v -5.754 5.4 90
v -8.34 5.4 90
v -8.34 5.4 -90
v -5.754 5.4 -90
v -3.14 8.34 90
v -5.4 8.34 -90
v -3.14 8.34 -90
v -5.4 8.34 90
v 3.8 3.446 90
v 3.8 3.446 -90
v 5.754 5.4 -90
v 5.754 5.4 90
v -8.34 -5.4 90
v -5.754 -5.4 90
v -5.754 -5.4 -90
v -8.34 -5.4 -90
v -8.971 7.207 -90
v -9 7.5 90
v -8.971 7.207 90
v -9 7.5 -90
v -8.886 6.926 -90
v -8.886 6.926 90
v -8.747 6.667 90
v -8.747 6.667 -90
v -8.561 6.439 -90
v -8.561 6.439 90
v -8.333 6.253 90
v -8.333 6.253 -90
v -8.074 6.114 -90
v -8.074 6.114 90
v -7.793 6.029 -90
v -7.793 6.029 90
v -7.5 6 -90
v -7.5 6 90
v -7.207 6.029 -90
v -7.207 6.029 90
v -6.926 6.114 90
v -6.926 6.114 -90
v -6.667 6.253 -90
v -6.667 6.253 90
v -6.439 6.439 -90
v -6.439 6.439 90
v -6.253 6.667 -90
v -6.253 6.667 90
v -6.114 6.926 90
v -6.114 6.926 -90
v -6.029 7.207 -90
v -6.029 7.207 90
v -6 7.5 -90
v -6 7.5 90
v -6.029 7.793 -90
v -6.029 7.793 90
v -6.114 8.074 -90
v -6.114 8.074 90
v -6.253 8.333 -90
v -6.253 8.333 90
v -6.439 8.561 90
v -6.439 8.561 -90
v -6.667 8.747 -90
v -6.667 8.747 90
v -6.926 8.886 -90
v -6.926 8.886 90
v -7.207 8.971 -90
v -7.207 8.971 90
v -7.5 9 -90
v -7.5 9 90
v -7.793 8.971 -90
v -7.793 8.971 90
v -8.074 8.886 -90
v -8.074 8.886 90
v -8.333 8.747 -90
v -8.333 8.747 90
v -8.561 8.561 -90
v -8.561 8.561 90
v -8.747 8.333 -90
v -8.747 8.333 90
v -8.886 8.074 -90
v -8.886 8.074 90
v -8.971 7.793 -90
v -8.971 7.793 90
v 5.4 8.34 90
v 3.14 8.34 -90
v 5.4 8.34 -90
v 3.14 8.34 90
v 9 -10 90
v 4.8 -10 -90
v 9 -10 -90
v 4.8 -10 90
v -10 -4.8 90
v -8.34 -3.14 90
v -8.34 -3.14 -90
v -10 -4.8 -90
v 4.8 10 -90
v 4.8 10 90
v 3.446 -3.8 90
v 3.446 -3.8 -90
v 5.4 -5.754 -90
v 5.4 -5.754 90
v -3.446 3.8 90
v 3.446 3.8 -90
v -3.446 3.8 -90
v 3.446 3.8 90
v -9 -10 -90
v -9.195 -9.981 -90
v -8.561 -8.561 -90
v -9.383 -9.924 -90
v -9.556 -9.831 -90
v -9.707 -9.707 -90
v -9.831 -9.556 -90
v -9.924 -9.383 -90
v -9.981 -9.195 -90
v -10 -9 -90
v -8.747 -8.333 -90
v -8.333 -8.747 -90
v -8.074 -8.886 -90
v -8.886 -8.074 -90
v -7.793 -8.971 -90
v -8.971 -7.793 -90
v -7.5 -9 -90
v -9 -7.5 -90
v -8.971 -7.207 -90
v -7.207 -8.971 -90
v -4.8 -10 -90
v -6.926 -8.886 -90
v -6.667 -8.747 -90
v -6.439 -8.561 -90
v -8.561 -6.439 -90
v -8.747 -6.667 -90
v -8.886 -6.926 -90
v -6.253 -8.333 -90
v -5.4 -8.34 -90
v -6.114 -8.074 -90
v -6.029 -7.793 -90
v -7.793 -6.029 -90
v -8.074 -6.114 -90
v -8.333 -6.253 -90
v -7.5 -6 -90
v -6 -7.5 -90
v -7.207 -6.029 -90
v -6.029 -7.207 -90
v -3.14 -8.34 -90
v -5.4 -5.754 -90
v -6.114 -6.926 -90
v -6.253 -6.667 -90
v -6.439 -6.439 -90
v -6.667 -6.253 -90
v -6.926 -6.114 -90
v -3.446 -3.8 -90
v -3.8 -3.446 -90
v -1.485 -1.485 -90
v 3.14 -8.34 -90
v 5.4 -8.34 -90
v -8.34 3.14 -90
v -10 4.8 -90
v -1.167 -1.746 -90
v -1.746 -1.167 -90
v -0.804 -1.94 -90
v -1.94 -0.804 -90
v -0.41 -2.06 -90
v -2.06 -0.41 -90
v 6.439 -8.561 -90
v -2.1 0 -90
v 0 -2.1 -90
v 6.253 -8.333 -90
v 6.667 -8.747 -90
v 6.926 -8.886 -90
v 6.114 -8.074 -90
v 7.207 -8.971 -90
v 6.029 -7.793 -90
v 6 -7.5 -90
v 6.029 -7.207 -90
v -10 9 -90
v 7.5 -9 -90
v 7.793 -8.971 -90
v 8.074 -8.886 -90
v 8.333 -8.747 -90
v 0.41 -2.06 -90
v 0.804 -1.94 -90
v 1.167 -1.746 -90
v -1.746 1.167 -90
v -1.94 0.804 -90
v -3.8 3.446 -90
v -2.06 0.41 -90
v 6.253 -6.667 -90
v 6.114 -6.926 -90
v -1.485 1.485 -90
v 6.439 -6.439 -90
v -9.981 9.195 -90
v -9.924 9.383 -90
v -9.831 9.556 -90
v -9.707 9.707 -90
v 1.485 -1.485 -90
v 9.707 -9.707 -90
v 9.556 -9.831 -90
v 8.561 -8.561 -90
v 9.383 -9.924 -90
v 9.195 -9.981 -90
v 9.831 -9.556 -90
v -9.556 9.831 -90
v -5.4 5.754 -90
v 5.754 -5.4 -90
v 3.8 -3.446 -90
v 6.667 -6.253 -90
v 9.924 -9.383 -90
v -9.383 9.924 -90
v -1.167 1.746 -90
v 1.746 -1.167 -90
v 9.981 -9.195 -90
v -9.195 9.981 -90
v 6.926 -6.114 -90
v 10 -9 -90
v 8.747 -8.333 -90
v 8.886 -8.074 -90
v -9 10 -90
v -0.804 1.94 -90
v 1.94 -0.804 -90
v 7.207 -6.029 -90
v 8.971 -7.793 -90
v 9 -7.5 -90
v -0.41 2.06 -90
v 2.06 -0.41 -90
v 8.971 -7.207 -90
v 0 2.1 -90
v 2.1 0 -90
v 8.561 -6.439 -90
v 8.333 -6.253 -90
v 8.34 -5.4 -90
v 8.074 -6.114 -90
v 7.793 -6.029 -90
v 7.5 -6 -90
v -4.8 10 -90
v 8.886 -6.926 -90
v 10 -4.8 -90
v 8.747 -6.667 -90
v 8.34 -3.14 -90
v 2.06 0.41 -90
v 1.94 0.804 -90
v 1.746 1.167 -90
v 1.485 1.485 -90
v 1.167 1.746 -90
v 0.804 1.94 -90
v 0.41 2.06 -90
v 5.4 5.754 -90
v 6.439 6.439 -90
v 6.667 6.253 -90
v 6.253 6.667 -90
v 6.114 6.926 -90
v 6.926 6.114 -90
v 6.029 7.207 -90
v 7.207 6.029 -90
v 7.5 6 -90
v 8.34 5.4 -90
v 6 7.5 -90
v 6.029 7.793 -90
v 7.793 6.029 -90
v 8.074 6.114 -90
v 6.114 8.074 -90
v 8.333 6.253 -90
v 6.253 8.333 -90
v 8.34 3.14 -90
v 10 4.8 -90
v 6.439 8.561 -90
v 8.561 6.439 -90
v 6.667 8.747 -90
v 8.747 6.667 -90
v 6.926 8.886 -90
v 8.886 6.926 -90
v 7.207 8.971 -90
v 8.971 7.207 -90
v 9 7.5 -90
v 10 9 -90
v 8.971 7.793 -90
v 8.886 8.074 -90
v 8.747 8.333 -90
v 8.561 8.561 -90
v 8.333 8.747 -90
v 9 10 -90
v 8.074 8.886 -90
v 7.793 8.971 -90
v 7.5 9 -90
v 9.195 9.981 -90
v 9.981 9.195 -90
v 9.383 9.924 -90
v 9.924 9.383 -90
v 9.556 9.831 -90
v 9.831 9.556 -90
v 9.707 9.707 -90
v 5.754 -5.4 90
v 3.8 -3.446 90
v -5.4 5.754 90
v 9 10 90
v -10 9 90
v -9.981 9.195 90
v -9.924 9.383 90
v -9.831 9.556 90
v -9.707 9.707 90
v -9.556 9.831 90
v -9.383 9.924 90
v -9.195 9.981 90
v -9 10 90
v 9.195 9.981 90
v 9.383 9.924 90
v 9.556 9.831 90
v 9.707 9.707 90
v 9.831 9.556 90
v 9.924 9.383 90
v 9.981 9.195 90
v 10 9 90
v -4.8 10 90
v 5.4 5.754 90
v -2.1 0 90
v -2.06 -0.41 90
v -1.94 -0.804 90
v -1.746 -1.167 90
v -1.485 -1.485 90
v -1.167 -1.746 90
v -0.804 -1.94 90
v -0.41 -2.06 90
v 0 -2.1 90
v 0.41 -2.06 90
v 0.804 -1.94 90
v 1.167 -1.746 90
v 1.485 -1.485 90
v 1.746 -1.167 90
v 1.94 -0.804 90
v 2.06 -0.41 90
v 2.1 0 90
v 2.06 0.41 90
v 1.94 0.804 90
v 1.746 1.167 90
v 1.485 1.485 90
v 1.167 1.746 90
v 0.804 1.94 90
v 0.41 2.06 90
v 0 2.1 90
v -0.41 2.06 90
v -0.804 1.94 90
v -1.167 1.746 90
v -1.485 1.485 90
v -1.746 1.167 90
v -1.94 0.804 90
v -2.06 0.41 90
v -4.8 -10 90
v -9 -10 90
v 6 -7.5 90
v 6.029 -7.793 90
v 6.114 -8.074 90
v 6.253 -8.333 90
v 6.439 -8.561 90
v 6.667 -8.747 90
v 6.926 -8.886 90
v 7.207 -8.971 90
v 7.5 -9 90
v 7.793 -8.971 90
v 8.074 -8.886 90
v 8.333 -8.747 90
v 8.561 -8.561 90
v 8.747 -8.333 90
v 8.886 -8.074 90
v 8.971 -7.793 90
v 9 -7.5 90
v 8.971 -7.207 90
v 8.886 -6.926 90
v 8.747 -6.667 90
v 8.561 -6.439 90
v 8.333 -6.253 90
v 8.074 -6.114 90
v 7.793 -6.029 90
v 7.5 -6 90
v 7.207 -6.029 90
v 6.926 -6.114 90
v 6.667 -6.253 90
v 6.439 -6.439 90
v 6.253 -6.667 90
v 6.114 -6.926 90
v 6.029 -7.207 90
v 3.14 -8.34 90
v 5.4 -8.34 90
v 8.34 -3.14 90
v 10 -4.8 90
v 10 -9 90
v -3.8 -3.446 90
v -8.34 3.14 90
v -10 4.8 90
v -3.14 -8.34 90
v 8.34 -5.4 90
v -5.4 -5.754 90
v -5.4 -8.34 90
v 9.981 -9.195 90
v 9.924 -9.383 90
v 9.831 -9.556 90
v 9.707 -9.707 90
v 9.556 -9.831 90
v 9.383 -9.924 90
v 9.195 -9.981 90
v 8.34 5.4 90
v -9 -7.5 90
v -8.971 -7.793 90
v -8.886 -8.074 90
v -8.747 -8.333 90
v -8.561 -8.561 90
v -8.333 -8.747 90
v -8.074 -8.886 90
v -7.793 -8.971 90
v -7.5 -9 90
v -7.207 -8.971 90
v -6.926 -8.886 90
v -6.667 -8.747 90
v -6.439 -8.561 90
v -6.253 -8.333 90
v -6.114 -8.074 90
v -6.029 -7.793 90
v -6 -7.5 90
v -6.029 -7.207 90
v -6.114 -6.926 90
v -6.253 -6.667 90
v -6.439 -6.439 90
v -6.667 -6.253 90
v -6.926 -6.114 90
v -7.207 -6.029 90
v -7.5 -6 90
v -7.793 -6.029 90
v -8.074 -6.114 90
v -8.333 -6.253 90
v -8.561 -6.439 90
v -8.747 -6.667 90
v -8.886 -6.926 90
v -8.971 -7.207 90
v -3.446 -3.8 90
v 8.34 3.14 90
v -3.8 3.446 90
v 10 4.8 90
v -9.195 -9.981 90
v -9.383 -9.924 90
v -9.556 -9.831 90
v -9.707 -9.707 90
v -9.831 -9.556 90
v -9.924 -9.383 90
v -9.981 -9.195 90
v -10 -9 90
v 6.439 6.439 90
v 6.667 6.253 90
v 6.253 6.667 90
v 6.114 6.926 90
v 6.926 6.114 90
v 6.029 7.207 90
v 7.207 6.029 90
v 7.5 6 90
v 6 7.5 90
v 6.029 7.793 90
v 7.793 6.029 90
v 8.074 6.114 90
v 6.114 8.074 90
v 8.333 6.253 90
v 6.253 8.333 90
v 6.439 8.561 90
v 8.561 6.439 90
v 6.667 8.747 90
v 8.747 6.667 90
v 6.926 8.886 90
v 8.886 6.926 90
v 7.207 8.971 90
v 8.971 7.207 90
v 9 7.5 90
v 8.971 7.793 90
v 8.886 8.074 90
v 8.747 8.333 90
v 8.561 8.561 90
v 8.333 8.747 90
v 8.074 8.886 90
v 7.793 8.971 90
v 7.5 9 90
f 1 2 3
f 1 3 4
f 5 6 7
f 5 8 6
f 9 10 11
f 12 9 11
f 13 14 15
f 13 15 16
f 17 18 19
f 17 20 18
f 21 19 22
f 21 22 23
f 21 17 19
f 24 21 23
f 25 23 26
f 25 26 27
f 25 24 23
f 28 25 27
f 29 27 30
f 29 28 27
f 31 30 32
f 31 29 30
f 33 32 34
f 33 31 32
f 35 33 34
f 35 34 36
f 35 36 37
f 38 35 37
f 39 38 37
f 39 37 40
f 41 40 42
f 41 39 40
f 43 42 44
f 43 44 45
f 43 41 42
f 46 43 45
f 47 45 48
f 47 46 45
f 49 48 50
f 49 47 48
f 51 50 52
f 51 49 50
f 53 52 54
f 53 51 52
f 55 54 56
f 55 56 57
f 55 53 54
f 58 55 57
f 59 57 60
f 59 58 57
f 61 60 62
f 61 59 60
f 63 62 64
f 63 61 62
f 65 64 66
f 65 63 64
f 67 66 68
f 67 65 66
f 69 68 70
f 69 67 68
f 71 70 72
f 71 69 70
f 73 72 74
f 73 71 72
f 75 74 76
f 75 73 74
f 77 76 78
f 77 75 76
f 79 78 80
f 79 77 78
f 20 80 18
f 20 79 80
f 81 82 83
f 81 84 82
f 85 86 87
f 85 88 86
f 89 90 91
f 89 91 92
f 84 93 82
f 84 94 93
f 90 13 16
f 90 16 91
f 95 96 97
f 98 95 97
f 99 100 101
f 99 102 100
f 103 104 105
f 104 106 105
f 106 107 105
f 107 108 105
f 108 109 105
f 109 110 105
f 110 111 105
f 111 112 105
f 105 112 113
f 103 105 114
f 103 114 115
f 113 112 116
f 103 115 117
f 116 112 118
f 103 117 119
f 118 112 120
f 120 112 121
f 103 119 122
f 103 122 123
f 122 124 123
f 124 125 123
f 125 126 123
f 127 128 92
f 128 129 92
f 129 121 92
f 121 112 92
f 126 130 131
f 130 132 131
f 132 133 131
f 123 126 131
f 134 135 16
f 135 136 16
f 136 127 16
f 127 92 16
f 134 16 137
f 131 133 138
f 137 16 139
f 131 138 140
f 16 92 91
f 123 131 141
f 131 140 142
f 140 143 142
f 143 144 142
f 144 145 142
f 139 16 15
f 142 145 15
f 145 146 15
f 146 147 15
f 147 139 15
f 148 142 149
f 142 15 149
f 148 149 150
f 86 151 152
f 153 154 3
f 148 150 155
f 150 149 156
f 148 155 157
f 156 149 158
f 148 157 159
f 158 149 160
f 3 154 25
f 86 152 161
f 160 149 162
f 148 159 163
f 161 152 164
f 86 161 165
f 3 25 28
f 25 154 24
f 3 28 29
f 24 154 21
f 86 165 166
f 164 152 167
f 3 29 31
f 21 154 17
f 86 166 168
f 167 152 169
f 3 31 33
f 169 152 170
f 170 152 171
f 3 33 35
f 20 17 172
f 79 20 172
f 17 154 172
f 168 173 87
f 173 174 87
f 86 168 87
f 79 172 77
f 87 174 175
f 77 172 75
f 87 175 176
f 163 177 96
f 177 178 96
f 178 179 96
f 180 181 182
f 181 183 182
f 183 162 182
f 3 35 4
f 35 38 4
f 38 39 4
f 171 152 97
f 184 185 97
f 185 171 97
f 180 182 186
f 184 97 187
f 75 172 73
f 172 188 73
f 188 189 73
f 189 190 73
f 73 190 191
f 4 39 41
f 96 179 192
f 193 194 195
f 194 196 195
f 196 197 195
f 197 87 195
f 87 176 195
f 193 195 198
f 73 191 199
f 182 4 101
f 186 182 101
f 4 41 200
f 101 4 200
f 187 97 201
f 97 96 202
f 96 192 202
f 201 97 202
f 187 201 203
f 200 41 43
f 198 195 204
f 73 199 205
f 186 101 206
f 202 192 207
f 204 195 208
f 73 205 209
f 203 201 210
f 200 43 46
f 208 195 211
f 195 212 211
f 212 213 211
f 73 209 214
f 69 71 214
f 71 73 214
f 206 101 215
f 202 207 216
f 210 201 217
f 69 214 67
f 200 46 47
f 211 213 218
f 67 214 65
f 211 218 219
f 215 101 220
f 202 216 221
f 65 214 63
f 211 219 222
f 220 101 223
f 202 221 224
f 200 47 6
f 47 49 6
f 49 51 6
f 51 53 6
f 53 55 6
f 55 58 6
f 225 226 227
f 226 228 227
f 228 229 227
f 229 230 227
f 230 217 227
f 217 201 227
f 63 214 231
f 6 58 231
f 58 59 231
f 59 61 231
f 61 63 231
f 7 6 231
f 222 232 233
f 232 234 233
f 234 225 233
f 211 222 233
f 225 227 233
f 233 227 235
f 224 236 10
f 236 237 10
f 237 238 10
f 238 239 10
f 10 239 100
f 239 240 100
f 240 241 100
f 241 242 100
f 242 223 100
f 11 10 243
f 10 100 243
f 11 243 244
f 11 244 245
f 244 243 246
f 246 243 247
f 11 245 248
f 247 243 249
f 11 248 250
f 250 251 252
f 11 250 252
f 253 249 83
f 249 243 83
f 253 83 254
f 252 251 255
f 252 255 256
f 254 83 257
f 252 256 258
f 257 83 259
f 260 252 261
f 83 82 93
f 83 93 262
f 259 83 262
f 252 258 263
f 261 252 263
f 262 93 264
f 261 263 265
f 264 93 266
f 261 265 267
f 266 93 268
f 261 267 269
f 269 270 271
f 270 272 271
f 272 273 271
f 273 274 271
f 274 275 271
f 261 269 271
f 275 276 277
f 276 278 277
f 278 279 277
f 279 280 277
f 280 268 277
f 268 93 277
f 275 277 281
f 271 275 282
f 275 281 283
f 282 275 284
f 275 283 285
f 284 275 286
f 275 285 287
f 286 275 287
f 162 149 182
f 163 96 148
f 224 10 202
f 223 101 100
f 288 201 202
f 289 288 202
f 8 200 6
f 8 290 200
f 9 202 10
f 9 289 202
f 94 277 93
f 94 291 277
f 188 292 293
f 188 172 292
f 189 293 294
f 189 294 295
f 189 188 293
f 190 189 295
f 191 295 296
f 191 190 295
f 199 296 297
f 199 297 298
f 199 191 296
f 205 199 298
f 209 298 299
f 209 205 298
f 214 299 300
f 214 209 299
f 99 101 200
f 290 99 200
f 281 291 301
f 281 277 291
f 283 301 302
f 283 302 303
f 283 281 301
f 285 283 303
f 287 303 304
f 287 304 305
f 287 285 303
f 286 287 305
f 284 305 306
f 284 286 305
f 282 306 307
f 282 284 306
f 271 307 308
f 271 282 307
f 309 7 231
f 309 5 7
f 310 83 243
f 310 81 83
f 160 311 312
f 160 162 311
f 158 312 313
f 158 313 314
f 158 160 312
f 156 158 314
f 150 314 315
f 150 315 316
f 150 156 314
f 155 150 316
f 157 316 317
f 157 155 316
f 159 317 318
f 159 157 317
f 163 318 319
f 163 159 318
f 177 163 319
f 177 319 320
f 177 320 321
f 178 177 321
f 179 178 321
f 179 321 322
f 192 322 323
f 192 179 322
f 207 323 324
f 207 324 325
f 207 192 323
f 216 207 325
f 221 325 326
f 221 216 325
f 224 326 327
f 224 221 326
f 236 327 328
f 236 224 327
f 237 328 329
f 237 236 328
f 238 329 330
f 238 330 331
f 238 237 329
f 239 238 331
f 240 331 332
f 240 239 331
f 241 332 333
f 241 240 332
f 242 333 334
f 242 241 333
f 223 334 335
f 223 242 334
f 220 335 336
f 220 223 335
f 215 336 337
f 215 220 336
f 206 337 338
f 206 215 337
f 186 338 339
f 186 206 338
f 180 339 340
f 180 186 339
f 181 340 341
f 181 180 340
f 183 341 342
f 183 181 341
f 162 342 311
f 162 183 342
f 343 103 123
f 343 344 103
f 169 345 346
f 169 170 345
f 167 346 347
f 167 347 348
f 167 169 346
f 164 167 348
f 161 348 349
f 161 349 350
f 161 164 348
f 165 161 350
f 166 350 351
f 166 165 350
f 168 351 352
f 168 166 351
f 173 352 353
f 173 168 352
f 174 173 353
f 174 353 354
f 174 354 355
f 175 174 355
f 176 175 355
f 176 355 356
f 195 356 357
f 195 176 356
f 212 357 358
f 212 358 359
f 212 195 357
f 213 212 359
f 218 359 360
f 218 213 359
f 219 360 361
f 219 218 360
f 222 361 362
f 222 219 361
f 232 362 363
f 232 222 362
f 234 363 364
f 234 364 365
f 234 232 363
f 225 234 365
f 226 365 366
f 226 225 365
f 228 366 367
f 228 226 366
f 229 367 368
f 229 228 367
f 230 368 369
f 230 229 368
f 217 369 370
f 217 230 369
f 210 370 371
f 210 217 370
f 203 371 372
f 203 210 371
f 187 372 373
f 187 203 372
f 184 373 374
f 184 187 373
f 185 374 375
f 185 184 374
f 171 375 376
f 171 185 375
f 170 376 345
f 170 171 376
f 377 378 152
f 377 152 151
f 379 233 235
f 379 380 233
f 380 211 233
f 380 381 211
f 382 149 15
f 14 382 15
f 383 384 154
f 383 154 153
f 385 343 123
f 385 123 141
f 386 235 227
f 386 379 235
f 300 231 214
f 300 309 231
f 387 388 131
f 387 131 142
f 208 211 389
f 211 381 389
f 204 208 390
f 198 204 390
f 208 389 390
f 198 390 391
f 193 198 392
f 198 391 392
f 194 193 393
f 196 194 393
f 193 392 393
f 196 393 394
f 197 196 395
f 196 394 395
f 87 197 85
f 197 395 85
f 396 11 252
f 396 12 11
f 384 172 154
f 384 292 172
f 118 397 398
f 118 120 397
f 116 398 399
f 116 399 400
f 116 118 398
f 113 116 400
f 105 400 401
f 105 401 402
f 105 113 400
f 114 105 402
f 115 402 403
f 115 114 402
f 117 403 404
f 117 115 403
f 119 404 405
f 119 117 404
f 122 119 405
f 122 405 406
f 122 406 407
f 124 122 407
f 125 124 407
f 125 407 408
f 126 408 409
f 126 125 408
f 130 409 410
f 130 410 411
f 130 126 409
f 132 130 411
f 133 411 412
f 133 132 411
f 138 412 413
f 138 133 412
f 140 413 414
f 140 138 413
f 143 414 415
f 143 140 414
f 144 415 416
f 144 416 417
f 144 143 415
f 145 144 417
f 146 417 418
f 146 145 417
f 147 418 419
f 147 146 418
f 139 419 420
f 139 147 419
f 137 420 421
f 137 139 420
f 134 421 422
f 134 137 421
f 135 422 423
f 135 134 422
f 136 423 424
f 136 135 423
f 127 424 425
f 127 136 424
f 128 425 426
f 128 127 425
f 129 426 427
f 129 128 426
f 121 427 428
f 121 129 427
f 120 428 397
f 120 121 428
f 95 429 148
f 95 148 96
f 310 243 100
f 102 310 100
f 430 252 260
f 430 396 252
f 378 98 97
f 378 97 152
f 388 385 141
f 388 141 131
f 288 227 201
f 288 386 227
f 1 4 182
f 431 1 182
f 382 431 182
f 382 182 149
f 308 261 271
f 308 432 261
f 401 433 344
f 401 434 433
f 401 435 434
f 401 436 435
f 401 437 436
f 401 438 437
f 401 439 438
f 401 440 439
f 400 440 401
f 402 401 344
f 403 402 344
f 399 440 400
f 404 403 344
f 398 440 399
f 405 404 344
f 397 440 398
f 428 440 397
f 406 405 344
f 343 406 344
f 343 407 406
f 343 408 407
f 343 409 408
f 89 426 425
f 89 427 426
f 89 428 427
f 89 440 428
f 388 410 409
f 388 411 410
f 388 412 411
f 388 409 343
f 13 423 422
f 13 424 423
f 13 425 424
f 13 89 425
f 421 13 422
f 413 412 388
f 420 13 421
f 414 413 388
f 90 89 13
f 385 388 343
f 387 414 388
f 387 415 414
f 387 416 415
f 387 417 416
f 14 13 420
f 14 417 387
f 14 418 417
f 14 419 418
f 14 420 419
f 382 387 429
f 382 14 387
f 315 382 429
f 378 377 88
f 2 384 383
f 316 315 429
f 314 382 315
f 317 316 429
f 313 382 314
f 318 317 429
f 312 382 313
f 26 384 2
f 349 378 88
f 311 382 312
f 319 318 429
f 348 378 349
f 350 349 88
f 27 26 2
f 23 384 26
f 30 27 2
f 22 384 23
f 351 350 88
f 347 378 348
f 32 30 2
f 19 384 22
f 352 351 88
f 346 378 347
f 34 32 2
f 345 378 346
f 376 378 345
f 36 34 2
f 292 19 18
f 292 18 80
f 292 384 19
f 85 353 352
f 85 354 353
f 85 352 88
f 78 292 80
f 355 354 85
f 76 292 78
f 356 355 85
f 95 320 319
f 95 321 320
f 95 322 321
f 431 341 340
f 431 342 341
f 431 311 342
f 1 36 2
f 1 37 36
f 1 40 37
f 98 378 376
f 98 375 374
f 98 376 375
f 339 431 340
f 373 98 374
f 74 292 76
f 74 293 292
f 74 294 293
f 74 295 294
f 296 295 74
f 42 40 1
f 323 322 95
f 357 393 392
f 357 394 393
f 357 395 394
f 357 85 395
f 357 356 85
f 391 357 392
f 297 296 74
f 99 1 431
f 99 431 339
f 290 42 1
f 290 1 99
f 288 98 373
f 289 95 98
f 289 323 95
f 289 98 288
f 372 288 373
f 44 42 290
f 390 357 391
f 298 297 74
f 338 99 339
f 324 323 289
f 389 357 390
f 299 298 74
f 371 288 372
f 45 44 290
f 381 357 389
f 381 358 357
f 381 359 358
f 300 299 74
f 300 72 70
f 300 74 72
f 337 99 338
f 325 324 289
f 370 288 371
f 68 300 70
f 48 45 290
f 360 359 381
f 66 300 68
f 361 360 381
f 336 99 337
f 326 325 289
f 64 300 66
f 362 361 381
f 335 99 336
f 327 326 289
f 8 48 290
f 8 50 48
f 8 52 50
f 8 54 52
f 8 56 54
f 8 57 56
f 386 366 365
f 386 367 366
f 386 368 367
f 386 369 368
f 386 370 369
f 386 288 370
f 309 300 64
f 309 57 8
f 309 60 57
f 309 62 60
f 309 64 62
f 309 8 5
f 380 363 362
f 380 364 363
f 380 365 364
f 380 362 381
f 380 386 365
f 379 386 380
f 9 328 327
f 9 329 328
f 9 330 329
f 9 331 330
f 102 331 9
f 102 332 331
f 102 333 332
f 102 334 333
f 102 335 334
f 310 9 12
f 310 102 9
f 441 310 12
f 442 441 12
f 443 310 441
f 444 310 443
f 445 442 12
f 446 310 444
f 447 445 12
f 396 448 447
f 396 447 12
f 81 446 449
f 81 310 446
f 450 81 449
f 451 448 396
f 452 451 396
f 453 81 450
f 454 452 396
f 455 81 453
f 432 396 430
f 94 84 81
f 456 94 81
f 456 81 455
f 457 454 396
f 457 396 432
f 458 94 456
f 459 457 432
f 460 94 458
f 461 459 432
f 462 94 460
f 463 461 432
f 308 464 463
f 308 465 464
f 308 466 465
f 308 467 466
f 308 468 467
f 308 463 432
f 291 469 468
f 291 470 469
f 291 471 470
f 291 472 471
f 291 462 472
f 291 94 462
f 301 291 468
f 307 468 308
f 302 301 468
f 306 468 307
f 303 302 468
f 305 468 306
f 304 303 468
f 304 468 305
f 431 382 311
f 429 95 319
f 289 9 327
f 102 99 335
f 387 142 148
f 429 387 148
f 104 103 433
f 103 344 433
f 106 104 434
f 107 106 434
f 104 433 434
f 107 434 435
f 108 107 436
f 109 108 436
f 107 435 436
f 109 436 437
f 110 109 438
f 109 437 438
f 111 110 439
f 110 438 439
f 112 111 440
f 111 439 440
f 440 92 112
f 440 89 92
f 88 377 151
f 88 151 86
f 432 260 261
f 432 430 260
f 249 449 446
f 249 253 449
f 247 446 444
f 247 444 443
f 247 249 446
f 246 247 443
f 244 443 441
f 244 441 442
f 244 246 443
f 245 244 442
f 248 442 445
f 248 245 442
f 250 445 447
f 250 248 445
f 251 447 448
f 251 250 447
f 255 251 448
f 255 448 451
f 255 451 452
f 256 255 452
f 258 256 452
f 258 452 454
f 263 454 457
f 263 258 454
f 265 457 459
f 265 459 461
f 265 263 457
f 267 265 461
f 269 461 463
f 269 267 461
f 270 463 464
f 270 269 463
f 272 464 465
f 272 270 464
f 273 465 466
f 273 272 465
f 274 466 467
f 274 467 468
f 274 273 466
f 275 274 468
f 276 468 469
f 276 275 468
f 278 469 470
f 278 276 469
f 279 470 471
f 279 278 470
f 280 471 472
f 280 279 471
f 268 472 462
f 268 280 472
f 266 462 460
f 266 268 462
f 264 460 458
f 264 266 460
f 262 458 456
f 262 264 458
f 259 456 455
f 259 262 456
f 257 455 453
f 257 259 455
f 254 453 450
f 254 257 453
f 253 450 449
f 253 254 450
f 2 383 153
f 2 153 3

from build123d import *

# Parameters (mm, degrees)
SKETCH_1_R      = 1.5
SKETCH_1_R_2    = 2.1
EXTRUDE_1_DEPTH = 90
FILLET_1_R      = 1


with BuildPart() as part:
    # 草图1 → 凸台-拉伸1 (new, symmetric)
    with BuildSketch(Plane.XY):
        Polygon((-10, 10), (-10, 4.8), (-8.34, 3.14), (-8.34, 5.4), (-5.753553391, 5.4), (-3.8, 3.446446609), (-3.8, -3.446446609), (-5.753553391, -5.4), (-8.34, -5.4), (-8.34, -3.14), (-10, -4.8), (-10, -10), (-4.8, -10), (-3.14, -8.34), (-5.4, -8.34), (-5.4, -5.753553391), (-3.446446609, -3.8), (3.446446609, -3.8), (5.4, -5.753553391), (5.4, -8.34), (3.14, -8.34), (4.8, -10), (10, -10), (10, -4.8), (8.34, -3.14), (8.34, -5.4), (5.753553391, -5.4), (3.8, -3.446446609), (3.8, 3.446446609), (5.753553391, 5.4), (8.34, 5.4), (8.34, 3.14), (10, 4.8), (10, 10), (4.8, 10), (3.14, 8.34), (5.4, 8.34), (5.4, 5.753553391), (3.446446609, 3.8), (-3.446446609, 3.8), (-5.4, 5.753553391), (-5.4, 8.34), (-3.14, 8.34), (-4.8, 10), align=None)
        with Locations(Location((-7.5, 7.5, 0), (0, 0, 180))):
            Circle(SKETCH_1_R, mode=Mode.SUBTRACT)
        with Locations(Location((0, 0, 0), (0, 0, 180))):
            Circle(SKETCH_1_R_2, mode=Mode.SUBTRACT)
        with Locations(Location((-7.5, -7.5, 0), (0, 0, 180))):
            Circle(SKETCH_1_R, mode=Mode.SUBTRACT)
        with Locations(Location((7.5, -7.5, 0), (0, 0, 180))):
            Circle(SKETCH_1_R, mode=Mode.SUBTRACT)
        with Locations(Location((7.5, 7.5, 0), (0, 0, 180))):
            Circle(SKETCH_1_R, mode=Mode.SUBTRACT)
    extrude(amount=EXTRUDE_1_DEPTH, both=True)

    # 圆角1
    fillet_1_edges = [part.edges().sort_by_distance(p)[0] for p in [
        (10, 10, 0),
        (10, -10, 0),
        (-10, -10, 0),
        (-10, 10, 0),
    ]]
    fillet(fillet_1_edges, radius=FILLET_1_R)


solid = part.part
